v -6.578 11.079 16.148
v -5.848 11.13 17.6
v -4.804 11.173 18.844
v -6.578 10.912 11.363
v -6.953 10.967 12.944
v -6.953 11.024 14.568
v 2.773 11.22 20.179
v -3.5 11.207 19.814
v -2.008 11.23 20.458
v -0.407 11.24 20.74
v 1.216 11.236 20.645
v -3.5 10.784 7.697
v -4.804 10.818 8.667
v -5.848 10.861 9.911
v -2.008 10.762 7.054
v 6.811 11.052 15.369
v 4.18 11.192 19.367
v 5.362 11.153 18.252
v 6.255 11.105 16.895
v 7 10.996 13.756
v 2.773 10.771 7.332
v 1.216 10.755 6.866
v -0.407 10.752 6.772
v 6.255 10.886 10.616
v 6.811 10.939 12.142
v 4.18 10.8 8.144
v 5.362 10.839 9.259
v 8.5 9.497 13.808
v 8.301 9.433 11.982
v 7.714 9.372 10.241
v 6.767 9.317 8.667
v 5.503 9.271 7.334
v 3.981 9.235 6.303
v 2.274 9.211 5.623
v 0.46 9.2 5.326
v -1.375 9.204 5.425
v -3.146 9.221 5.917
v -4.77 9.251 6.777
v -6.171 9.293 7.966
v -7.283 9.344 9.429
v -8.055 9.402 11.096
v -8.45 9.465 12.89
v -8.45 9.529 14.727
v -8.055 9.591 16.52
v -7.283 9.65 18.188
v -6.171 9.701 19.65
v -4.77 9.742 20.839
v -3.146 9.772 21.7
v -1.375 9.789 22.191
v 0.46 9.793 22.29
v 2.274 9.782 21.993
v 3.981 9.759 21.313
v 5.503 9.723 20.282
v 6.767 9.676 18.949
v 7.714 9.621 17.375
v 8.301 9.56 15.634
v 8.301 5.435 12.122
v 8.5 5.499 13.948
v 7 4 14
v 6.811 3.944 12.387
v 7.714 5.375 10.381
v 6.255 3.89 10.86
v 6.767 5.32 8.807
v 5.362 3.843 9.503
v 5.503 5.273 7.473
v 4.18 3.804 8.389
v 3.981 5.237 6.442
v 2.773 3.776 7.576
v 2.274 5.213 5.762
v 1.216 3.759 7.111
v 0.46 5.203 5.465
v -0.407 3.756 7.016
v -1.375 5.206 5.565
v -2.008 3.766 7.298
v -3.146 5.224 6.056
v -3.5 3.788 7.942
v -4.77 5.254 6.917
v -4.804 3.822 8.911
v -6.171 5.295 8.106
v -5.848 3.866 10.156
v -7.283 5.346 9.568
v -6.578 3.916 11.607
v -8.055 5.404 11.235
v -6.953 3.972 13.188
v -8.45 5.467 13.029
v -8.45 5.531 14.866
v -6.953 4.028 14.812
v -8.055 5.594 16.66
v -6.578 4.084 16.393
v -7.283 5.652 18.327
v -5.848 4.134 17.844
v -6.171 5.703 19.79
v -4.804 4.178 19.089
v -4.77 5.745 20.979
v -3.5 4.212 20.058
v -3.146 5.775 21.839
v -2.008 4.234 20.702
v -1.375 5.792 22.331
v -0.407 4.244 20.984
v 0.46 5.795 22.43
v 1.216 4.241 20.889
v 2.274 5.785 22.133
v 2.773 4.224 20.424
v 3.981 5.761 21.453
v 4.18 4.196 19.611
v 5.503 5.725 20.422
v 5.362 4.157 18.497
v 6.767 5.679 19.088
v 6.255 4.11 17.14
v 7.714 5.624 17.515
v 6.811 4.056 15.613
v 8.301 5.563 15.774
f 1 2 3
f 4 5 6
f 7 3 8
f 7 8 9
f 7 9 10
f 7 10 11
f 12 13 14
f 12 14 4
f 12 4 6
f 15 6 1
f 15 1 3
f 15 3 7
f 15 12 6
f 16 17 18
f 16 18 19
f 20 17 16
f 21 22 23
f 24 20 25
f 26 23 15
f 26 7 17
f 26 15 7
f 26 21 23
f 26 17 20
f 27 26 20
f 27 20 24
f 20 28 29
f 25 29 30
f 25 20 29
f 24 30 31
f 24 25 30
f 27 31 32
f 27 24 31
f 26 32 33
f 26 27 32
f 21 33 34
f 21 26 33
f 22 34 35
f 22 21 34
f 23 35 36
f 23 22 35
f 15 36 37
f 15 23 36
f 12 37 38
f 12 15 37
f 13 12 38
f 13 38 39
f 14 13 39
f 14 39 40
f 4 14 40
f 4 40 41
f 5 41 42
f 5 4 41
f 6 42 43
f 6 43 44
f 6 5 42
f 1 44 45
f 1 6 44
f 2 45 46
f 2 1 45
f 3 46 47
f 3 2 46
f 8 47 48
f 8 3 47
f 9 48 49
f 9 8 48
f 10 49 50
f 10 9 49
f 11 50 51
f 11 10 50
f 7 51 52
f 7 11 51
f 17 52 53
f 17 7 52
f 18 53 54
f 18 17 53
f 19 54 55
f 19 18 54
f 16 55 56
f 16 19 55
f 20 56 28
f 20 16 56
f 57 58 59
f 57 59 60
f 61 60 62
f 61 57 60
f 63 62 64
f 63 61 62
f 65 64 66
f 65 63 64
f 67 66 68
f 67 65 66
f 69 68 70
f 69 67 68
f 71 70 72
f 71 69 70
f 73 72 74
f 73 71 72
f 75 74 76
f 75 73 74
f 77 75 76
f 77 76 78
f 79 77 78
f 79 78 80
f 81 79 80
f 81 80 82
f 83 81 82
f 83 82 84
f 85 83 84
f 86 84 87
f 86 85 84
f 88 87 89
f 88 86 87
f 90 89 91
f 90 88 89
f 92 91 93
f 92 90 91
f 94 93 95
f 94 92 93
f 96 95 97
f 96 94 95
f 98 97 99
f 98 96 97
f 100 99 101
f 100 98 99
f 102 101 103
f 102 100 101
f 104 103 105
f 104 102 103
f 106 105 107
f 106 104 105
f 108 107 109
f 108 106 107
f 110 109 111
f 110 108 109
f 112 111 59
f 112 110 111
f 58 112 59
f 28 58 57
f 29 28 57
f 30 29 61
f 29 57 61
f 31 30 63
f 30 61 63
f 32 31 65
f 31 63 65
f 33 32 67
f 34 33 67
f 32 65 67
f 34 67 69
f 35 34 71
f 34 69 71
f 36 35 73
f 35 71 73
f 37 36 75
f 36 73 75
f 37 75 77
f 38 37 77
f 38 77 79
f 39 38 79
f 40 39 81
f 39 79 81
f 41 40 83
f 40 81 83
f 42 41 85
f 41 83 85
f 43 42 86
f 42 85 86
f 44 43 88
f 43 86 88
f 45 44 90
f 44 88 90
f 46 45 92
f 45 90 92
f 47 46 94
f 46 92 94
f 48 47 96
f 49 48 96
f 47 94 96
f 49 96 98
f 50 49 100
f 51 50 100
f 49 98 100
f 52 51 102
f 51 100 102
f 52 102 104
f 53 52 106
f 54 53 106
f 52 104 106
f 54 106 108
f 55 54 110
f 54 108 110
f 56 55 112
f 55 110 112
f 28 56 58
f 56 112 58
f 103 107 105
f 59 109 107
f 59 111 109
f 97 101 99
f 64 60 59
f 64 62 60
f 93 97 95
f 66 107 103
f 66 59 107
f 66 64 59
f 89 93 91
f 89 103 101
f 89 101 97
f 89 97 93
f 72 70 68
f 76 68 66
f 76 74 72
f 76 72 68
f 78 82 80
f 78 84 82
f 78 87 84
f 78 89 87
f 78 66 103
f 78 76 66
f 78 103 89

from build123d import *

# Parameters (mm, degrees)
CYLINDER012_R                = 8.5
CYLINDER012_DEPTH            = 4
FUSION006005_PLACEMENT_ANGLE = 92


with BuildPart() as cone001:
    # Cone001 → Cone001 (revolve)
    with BuildSketch(Plane(origin=(0, 0, 5.5), x_dir=(1, 0, 0), z_dir=(0, -1, 0))):
        Polygon((0, 0), (8.5, 0), (7, 1.5), (0, 1.5), align=None)
    revolve(axis=Axis((0, 0, 5.5), (0, 0, 1)))


with BuildPart() as cylinder009:
    # Cylinder012 → Cylinder012 (new body)
    with BuildSketch(Plane.XY.offset(1.5)):
        Circle(CYLINDER012_R)
    extrude(amount=CYLINDER012_DEPTH)


with BuildPart() as fusion006005:
    # Cone → Cone (revolve)
    with BuildSketch(Plane.XZ):
        Polygon((0, 0), (7, 0), (8.5, 1.5), (0, 1.5), align=None)
    revolve(axis=Axis((0, 0, 0), (0, 0, 1)))

    # Fusion006005: union Cone001, Cylinder009
    add(cone001.part)
    add(cylinder009.part)


with BuildPart() as fusion006005_1:
    # Fusion006005 placement: moved
    add(fusion006005.part.moved(Location((0, 4, 14))).rotate(Axis((0, 4, 14), (-1, 0, 0)), FUSION006005_PLACEMENT_ANGLE))


solid = fusion006005_1.part
